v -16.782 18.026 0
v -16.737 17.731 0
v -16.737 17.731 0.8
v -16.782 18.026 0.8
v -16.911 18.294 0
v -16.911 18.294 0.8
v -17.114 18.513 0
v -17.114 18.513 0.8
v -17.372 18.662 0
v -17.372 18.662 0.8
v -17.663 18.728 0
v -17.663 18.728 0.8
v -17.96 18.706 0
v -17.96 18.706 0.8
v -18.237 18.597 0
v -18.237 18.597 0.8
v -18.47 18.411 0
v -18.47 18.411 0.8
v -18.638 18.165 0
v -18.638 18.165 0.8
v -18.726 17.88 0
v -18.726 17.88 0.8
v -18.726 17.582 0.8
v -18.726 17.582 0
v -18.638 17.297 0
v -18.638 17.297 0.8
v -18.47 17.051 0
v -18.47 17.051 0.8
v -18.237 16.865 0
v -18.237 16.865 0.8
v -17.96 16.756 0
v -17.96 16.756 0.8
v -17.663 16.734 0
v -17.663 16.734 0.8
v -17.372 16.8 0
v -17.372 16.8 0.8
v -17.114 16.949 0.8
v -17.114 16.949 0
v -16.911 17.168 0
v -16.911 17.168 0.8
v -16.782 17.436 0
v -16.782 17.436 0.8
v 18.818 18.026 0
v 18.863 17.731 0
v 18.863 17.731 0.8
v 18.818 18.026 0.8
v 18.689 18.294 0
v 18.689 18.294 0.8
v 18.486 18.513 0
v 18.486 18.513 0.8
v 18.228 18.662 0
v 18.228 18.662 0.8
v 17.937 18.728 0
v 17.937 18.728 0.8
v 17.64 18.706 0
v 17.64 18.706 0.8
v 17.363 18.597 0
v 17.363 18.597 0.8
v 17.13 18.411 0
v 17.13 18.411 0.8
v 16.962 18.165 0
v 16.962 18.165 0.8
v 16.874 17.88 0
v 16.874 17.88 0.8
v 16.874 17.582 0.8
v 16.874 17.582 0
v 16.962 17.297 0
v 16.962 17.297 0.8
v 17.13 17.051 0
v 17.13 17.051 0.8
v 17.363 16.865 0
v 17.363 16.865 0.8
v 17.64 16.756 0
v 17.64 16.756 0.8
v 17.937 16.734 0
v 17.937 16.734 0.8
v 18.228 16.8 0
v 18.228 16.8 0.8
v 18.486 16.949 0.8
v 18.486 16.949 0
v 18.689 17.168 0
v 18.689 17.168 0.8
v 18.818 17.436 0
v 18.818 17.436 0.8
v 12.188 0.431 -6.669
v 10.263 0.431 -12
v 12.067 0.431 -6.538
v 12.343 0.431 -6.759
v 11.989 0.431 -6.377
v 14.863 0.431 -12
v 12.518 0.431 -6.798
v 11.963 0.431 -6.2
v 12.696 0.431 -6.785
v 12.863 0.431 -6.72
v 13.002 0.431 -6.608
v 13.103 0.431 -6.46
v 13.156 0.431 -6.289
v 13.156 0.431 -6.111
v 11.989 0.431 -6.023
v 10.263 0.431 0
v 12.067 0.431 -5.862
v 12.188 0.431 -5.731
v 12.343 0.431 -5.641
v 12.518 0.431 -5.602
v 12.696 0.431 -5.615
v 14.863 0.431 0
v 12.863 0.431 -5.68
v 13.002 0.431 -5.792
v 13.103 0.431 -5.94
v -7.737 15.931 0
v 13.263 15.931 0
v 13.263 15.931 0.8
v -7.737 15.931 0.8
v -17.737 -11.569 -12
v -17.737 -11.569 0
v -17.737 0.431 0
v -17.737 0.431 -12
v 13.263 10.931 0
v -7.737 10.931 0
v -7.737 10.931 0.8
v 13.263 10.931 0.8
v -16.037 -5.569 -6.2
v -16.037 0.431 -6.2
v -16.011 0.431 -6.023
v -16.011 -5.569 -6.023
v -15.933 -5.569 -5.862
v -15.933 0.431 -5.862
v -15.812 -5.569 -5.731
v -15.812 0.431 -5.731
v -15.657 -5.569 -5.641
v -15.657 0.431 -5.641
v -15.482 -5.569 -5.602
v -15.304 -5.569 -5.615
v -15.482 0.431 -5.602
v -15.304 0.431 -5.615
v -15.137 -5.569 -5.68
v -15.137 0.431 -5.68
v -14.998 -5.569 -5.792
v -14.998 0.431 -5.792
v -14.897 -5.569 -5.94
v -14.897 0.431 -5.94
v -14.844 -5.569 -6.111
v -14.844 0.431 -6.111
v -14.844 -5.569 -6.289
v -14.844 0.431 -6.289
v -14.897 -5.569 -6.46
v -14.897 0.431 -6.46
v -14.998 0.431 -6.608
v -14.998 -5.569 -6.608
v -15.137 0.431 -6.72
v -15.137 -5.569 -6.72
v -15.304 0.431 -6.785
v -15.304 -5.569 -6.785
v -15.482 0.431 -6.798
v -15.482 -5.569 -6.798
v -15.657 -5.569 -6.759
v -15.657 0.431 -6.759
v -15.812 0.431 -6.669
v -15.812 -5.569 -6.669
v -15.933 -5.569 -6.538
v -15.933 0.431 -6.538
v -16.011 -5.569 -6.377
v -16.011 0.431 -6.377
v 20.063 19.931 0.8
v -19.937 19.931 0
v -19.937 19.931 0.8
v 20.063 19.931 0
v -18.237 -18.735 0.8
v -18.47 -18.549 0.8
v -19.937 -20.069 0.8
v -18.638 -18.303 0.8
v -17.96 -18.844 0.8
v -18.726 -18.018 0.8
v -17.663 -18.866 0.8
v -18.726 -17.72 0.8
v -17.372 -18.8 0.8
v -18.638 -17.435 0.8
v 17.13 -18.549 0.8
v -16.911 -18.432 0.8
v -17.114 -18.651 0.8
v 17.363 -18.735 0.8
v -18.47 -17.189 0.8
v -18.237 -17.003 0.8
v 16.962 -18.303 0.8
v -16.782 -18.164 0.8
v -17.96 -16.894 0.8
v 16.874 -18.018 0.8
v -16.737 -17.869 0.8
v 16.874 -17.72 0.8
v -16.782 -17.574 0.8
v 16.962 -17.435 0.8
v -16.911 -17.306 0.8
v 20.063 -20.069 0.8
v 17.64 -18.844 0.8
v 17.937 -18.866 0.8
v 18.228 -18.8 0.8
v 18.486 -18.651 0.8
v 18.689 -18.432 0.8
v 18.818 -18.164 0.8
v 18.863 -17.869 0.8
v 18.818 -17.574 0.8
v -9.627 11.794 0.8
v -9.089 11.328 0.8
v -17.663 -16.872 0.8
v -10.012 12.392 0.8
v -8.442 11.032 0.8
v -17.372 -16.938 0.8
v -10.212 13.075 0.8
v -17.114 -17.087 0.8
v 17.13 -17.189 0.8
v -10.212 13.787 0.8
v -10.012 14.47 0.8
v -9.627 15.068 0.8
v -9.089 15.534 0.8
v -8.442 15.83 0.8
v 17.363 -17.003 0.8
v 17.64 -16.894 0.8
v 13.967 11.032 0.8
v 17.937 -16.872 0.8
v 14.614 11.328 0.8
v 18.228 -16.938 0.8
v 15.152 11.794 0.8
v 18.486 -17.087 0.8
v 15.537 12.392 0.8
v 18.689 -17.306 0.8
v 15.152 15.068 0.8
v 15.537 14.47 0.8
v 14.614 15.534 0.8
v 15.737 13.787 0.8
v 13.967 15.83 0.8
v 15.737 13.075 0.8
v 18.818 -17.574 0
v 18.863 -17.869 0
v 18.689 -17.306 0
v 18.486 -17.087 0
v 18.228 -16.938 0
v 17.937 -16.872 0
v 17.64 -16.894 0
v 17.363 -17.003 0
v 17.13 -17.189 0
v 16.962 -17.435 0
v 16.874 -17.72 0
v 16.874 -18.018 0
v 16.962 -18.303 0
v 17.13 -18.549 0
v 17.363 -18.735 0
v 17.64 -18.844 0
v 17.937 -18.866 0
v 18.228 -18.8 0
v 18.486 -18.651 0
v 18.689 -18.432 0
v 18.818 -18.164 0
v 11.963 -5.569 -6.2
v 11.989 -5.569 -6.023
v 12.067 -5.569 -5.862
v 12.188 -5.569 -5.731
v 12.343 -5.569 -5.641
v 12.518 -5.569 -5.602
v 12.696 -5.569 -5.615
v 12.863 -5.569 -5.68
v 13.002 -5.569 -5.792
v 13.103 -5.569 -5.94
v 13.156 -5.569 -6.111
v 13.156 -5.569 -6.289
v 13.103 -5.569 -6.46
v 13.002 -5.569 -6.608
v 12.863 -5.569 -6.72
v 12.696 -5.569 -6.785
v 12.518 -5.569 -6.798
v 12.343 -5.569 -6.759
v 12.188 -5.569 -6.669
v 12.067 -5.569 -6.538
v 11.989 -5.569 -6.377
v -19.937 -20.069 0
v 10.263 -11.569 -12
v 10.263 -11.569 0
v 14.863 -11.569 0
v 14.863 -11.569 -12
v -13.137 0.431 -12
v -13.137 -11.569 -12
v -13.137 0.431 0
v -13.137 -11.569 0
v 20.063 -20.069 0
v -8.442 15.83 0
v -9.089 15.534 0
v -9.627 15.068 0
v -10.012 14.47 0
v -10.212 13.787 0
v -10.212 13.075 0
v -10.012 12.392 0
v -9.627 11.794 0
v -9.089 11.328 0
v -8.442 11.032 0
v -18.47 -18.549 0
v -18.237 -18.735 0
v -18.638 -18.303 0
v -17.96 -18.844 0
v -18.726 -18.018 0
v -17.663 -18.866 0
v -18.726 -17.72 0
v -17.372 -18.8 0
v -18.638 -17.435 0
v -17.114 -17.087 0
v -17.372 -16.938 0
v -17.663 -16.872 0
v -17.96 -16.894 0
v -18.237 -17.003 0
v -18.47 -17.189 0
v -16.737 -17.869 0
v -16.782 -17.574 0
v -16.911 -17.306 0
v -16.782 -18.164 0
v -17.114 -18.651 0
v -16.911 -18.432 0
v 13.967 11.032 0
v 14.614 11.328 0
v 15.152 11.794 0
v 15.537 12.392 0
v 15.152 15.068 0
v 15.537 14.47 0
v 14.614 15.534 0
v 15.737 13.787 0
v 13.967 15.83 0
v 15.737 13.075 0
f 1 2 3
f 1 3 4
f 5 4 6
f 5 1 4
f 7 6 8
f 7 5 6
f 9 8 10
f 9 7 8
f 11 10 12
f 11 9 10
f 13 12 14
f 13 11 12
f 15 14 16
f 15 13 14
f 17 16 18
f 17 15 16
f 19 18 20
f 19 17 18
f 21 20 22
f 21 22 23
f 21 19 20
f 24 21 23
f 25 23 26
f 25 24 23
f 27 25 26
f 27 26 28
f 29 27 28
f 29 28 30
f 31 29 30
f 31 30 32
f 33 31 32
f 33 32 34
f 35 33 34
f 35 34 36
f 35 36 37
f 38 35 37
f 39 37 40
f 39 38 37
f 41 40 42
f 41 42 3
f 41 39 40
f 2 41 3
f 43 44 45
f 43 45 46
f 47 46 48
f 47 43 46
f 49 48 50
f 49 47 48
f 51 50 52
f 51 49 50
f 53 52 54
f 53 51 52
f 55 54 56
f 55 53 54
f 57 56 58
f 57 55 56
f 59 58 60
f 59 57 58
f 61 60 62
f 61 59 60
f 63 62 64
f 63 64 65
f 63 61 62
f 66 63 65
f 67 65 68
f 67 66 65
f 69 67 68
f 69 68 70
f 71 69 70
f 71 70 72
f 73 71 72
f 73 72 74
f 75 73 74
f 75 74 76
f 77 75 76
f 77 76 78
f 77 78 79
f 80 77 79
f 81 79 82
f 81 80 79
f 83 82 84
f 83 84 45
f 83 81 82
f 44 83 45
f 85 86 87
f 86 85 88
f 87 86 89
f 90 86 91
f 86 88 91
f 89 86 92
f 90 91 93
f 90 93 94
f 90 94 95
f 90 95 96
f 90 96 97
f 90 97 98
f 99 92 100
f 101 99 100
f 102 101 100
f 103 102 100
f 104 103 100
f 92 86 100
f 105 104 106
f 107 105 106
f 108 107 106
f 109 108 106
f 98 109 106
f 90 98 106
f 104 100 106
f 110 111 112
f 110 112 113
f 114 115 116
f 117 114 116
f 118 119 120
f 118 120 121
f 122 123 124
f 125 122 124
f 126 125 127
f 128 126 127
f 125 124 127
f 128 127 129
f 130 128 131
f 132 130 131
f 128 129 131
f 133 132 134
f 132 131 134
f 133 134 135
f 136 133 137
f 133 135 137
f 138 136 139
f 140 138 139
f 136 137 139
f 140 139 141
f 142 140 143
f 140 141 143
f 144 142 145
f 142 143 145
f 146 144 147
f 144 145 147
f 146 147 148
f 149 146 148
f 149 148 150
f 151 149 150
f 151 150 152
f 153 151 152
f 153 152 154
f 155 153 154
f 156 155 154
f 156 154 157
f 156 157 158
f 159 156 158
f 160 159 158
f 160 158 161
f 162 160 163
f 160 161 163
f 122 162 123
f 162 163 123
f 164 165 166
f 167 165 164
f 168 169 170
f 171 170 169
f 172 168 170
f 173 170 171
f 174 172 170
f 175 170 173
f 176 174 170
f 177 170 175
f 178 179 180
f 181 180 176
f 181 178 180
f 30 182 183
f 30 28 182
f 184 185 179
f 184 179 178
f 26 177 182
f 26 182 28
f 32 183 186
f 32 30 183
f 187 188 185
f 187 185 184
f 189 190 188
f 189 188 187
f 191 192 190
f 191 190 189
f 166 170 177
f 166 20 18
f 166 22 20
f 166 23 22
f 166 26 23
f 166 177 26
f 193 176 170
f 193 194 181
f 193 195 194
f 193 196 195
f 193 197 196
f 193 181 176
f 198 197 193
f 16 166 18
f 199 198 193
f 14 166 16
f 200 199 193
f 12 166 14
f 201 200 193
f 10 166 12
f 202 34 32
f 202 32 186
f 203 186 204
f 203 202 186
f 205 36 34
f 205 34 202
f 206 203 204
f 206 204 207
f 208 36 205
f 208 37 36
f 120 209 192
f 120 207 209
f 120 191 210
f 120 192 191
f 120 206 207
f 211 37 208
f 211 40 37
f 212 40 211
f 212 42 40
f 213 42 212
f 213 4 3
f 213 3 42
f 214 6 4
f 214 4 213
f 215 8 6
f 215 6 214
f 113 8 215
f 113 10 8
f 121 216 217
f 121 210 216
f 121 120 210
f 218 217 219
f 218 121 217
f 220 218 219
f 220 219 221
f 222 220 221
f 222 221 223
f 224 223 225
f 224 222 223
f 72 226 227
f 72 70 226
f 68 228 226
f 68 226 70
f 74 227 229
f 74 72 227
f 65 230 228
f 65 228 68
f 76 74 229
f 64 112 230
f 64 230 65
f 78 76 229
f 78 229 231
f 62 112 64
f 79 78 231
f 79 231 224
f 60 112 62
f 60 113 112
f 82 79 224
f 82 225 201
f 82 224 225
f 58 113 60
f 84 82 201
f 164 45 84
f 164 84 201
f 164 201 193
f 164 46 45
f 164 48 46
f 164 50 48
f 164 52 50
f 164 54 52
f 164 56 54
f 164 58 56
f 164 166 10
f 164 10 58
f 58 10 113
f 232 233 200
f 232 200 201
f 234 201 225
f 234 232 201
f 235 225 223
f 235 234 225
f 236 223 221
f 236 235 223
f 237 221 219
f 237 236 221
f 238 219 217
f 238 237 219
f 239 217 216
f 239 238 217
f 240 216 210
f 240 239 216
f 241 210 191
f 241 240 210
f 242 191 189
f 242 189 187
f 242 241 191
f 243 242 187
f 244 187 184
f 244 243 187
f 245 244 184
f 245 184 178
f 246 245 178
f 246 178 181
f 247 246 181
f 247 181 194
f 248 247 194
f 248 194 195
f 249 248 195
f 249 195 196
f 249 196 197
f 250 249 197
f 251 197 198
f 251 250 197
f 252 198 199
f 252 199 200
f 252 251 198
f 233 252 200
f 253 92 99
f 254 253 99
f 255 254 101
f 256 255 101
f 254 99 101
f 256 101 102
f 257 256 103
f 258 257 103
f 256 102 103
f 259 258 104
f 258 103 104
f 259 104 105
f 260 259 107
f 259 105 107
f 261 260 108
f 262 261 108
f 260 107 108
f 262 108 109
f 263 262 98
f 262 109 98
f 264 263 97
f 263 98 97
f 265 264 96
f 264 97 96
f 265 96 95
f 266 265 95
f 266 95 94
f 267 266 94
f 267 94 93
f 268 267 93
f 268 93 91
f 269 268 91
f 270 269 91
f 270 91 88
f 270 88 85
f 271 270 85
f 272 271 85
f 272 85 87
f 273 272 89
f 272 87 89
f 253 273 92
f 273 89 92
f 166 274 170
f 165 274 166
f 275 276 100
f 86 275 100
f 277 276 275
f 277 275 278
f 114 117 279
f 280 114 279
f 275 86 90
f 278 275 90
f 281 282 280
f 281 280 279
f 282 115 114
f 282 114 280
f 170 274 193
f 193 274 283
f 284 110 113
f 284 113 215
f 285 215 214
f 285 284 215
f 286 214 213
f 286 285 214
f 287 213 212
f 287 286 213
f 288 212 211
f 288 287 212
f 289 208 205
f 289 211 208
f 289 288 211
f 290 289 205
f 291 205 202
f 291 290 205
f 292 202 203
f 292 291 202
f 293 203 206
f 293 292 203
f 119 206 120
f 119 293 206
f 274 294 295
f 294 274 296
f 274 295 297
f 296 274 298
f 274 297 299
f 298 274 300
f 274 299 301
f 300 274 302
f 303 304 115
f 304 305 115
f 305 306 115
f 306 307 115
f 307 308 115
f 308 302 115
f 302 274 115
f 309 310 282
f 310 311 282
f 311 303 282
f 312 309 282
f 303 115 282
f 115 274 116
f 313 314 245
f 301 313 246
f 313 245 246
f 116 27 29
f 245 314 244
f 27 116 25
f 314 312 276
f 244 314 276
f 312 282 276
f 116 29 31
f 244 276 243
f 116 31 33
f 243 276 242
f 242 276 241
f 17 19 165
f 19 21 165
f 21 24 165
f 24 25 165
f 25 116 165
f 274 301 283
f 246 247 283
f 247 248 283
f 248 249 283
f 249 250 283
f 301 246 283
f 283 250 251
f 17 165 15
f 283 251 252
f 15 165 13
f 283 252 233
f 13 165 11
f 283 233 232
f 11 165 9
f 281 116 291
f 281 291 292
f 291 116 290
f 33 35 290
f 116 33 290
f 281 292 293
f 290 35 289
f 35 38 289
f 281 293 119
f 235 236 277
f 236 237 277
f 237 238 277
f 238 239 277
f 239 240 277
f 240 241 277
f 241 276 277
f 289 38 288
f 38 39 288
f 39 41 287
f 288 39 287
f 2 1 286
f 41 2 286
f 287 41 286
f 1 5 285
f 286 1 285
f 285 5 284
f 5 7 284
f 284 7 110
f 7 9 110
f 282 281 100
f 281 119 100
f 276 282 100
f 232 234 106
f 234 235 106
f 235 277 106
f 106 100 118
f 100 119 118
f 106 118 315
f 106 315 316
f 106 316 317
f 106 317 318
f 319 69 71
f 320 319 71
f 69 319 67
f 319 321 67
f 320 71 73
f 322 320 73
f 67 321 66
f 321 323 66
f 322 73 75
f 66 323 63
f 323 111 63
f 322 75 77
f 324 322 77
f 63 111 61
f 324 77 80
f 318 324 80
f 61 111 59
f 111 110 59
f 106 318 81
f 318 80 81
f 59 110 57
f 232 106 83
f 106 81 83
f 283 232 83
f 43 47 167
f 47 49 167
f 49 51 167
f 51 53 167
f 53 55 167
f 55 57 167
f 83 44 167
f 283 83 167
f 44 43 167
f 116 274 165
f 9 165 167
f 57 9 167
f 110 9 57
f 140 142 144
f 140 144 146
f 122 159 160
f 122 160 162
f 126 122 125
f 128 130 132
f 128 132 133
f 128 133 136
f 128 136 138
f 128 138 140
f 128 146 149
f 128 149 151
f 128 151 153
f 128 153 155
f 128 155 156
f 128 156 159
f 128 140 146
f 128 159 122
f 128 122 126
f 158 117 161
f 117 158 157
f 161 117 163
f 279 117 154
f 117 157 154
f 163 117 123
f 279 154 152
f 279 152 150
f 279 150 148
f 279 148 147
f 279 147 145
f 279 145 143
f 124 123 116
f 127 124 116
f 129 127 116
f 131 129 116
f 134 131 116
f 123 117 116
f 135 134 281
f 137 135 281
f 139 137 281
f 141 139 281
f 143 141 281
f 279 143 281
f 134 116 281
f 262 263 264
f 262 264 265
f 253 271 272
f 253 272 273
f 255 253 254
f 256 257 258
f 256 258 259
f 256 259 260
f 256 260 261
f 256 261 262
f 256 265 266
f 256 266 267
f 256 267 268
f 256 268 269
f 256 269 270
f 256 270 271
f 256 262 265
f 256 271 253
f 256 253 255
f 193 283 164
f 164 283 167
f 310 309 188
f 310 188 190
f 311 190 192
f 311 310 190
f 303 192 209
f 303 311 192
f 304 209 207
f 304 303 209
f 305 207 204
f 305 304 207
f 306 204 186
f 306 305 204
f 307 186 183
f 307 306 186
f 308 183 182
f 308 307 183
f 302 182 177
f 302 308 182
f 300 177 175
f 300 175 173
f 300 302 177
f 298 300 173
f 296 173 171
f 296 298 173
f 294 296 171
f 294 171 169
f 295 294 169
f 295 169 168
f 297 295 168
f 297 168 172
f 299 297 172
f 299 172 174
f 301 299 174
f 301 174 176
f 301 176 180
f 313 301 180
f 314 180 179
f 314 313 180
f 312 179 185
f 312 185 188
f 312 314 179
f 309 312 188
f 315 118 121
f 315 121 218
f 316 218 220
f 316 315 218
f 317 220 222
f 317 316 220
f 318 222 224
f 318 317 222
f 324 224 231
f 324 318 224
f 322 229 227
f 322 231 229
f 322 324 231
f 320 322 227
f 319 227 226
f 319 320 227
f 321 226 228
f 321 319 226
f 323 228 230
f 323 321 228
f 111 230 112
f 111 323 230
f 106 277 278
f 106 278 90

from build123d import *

# Parameters (mm, degrees)
SKETCH1_W           = 40
SKETCH1_H           = 40
SKETCH1_R           = 1
BOSS_EXTRUDE1_DEPTH = 0.8
SKETCH4_W           = 4.6
SKETCH4_H           = 12
BOSS_EXTRUDE2_DEPTH = 12.8
SKETCH5_R           = 0.6
CUT_EXTRUDE1_DEPTH  = 6
CUT_EXTRUDE2_DEPTH  = 6


with BuildPart() as part:
    # Sketch1 → Boss-Extrude1 (new body)
    with BuildSketch(Plane.XY):
        with Locations((0.062552029, -0.069037071)):
            Rectangle(SKETCH1_W, SKETCH1_H)
        with Locations((17.862552029, -17.869037071)):
            Circle(SKETCH1_R, mode=Mode.SUBTRACT)
        with Locations((17.862552029, 17.730962929)):
            Circle(SKETCH1_R, mode=Mode.SUBTRACT)
        with Locations((-17.737447971, 17.730962929)):
            Circle(SKETCH1_R, mode=Mode.SUBTRACT)
        with Locations((-17.737447971, -17.869037071)):
            Circle(SKETCH1_R, mode=Mode.SUBTRACT)
    extrude(amount=BOSS_EXTRUDE1_DEPTH)

    # Sketch4 → Boss-Extrude2 (add)
    with BuildSketch(Plane.XY.offset(0.8)):
        with Locations((12.562552029, -5.569037071)):
            Rectangle(SKETCH4_W, SKETCH4_H)
        with Locations((-15.437447971, -5.569037071)):
            Rectangle(SKETCH4_W, SKETCH4_H)
    extrude(amount=-BOSS_EXTRUDE2_DEPTH)

    # Sketch5 → Cut-Extrude1 (cut)
    with BuildSketch(Plane(origin=(0, 0.430962929, 0), x_dir=(1, 0, 0), z_dir=(0, 1, 0))):
        with Locations(Location((-15.437447971, 6.2, 0), (0, 0, 180))):
            Circle(SKETCH5_R)
        with Locations(Location((12.562552029, 6.2, 0), (0, 0, 180))):
            Circle(SKETCH5_R)
    extrude(amount=-CUT_EXTRUDE1_DEPTH, mode=Mode.SUBTRACT)

    # Sketch6 → Cut-Extrude2 (cut)
    with BuildSketch(Plane(origin=(0, 0, 0), x_dir=(-1, 0, 0), z_dir=(0, 0, -1))):
        with BuildLine():
            Line((7.737447971, 10.930962929), (-13.262552029, 10.930962929))
            ThreePointArc((-13.262552029, 10.930962929), (-15.762552029, 13.430962929), (-13.262552029, 15.930962929))
            Line((-13.262552029, 15.930962929), (7.737447971, 15.930962929))
            ThreePointArc((7.737447971, 15.930962929), (10.237447971, 13.430962929), (7.737447971, 10.930962929))
        make_face()
    extrude(amount=-CUT_EXTRUDE2_DEPTH, mode=Mode.SUBTRACT)


solid = part.part
